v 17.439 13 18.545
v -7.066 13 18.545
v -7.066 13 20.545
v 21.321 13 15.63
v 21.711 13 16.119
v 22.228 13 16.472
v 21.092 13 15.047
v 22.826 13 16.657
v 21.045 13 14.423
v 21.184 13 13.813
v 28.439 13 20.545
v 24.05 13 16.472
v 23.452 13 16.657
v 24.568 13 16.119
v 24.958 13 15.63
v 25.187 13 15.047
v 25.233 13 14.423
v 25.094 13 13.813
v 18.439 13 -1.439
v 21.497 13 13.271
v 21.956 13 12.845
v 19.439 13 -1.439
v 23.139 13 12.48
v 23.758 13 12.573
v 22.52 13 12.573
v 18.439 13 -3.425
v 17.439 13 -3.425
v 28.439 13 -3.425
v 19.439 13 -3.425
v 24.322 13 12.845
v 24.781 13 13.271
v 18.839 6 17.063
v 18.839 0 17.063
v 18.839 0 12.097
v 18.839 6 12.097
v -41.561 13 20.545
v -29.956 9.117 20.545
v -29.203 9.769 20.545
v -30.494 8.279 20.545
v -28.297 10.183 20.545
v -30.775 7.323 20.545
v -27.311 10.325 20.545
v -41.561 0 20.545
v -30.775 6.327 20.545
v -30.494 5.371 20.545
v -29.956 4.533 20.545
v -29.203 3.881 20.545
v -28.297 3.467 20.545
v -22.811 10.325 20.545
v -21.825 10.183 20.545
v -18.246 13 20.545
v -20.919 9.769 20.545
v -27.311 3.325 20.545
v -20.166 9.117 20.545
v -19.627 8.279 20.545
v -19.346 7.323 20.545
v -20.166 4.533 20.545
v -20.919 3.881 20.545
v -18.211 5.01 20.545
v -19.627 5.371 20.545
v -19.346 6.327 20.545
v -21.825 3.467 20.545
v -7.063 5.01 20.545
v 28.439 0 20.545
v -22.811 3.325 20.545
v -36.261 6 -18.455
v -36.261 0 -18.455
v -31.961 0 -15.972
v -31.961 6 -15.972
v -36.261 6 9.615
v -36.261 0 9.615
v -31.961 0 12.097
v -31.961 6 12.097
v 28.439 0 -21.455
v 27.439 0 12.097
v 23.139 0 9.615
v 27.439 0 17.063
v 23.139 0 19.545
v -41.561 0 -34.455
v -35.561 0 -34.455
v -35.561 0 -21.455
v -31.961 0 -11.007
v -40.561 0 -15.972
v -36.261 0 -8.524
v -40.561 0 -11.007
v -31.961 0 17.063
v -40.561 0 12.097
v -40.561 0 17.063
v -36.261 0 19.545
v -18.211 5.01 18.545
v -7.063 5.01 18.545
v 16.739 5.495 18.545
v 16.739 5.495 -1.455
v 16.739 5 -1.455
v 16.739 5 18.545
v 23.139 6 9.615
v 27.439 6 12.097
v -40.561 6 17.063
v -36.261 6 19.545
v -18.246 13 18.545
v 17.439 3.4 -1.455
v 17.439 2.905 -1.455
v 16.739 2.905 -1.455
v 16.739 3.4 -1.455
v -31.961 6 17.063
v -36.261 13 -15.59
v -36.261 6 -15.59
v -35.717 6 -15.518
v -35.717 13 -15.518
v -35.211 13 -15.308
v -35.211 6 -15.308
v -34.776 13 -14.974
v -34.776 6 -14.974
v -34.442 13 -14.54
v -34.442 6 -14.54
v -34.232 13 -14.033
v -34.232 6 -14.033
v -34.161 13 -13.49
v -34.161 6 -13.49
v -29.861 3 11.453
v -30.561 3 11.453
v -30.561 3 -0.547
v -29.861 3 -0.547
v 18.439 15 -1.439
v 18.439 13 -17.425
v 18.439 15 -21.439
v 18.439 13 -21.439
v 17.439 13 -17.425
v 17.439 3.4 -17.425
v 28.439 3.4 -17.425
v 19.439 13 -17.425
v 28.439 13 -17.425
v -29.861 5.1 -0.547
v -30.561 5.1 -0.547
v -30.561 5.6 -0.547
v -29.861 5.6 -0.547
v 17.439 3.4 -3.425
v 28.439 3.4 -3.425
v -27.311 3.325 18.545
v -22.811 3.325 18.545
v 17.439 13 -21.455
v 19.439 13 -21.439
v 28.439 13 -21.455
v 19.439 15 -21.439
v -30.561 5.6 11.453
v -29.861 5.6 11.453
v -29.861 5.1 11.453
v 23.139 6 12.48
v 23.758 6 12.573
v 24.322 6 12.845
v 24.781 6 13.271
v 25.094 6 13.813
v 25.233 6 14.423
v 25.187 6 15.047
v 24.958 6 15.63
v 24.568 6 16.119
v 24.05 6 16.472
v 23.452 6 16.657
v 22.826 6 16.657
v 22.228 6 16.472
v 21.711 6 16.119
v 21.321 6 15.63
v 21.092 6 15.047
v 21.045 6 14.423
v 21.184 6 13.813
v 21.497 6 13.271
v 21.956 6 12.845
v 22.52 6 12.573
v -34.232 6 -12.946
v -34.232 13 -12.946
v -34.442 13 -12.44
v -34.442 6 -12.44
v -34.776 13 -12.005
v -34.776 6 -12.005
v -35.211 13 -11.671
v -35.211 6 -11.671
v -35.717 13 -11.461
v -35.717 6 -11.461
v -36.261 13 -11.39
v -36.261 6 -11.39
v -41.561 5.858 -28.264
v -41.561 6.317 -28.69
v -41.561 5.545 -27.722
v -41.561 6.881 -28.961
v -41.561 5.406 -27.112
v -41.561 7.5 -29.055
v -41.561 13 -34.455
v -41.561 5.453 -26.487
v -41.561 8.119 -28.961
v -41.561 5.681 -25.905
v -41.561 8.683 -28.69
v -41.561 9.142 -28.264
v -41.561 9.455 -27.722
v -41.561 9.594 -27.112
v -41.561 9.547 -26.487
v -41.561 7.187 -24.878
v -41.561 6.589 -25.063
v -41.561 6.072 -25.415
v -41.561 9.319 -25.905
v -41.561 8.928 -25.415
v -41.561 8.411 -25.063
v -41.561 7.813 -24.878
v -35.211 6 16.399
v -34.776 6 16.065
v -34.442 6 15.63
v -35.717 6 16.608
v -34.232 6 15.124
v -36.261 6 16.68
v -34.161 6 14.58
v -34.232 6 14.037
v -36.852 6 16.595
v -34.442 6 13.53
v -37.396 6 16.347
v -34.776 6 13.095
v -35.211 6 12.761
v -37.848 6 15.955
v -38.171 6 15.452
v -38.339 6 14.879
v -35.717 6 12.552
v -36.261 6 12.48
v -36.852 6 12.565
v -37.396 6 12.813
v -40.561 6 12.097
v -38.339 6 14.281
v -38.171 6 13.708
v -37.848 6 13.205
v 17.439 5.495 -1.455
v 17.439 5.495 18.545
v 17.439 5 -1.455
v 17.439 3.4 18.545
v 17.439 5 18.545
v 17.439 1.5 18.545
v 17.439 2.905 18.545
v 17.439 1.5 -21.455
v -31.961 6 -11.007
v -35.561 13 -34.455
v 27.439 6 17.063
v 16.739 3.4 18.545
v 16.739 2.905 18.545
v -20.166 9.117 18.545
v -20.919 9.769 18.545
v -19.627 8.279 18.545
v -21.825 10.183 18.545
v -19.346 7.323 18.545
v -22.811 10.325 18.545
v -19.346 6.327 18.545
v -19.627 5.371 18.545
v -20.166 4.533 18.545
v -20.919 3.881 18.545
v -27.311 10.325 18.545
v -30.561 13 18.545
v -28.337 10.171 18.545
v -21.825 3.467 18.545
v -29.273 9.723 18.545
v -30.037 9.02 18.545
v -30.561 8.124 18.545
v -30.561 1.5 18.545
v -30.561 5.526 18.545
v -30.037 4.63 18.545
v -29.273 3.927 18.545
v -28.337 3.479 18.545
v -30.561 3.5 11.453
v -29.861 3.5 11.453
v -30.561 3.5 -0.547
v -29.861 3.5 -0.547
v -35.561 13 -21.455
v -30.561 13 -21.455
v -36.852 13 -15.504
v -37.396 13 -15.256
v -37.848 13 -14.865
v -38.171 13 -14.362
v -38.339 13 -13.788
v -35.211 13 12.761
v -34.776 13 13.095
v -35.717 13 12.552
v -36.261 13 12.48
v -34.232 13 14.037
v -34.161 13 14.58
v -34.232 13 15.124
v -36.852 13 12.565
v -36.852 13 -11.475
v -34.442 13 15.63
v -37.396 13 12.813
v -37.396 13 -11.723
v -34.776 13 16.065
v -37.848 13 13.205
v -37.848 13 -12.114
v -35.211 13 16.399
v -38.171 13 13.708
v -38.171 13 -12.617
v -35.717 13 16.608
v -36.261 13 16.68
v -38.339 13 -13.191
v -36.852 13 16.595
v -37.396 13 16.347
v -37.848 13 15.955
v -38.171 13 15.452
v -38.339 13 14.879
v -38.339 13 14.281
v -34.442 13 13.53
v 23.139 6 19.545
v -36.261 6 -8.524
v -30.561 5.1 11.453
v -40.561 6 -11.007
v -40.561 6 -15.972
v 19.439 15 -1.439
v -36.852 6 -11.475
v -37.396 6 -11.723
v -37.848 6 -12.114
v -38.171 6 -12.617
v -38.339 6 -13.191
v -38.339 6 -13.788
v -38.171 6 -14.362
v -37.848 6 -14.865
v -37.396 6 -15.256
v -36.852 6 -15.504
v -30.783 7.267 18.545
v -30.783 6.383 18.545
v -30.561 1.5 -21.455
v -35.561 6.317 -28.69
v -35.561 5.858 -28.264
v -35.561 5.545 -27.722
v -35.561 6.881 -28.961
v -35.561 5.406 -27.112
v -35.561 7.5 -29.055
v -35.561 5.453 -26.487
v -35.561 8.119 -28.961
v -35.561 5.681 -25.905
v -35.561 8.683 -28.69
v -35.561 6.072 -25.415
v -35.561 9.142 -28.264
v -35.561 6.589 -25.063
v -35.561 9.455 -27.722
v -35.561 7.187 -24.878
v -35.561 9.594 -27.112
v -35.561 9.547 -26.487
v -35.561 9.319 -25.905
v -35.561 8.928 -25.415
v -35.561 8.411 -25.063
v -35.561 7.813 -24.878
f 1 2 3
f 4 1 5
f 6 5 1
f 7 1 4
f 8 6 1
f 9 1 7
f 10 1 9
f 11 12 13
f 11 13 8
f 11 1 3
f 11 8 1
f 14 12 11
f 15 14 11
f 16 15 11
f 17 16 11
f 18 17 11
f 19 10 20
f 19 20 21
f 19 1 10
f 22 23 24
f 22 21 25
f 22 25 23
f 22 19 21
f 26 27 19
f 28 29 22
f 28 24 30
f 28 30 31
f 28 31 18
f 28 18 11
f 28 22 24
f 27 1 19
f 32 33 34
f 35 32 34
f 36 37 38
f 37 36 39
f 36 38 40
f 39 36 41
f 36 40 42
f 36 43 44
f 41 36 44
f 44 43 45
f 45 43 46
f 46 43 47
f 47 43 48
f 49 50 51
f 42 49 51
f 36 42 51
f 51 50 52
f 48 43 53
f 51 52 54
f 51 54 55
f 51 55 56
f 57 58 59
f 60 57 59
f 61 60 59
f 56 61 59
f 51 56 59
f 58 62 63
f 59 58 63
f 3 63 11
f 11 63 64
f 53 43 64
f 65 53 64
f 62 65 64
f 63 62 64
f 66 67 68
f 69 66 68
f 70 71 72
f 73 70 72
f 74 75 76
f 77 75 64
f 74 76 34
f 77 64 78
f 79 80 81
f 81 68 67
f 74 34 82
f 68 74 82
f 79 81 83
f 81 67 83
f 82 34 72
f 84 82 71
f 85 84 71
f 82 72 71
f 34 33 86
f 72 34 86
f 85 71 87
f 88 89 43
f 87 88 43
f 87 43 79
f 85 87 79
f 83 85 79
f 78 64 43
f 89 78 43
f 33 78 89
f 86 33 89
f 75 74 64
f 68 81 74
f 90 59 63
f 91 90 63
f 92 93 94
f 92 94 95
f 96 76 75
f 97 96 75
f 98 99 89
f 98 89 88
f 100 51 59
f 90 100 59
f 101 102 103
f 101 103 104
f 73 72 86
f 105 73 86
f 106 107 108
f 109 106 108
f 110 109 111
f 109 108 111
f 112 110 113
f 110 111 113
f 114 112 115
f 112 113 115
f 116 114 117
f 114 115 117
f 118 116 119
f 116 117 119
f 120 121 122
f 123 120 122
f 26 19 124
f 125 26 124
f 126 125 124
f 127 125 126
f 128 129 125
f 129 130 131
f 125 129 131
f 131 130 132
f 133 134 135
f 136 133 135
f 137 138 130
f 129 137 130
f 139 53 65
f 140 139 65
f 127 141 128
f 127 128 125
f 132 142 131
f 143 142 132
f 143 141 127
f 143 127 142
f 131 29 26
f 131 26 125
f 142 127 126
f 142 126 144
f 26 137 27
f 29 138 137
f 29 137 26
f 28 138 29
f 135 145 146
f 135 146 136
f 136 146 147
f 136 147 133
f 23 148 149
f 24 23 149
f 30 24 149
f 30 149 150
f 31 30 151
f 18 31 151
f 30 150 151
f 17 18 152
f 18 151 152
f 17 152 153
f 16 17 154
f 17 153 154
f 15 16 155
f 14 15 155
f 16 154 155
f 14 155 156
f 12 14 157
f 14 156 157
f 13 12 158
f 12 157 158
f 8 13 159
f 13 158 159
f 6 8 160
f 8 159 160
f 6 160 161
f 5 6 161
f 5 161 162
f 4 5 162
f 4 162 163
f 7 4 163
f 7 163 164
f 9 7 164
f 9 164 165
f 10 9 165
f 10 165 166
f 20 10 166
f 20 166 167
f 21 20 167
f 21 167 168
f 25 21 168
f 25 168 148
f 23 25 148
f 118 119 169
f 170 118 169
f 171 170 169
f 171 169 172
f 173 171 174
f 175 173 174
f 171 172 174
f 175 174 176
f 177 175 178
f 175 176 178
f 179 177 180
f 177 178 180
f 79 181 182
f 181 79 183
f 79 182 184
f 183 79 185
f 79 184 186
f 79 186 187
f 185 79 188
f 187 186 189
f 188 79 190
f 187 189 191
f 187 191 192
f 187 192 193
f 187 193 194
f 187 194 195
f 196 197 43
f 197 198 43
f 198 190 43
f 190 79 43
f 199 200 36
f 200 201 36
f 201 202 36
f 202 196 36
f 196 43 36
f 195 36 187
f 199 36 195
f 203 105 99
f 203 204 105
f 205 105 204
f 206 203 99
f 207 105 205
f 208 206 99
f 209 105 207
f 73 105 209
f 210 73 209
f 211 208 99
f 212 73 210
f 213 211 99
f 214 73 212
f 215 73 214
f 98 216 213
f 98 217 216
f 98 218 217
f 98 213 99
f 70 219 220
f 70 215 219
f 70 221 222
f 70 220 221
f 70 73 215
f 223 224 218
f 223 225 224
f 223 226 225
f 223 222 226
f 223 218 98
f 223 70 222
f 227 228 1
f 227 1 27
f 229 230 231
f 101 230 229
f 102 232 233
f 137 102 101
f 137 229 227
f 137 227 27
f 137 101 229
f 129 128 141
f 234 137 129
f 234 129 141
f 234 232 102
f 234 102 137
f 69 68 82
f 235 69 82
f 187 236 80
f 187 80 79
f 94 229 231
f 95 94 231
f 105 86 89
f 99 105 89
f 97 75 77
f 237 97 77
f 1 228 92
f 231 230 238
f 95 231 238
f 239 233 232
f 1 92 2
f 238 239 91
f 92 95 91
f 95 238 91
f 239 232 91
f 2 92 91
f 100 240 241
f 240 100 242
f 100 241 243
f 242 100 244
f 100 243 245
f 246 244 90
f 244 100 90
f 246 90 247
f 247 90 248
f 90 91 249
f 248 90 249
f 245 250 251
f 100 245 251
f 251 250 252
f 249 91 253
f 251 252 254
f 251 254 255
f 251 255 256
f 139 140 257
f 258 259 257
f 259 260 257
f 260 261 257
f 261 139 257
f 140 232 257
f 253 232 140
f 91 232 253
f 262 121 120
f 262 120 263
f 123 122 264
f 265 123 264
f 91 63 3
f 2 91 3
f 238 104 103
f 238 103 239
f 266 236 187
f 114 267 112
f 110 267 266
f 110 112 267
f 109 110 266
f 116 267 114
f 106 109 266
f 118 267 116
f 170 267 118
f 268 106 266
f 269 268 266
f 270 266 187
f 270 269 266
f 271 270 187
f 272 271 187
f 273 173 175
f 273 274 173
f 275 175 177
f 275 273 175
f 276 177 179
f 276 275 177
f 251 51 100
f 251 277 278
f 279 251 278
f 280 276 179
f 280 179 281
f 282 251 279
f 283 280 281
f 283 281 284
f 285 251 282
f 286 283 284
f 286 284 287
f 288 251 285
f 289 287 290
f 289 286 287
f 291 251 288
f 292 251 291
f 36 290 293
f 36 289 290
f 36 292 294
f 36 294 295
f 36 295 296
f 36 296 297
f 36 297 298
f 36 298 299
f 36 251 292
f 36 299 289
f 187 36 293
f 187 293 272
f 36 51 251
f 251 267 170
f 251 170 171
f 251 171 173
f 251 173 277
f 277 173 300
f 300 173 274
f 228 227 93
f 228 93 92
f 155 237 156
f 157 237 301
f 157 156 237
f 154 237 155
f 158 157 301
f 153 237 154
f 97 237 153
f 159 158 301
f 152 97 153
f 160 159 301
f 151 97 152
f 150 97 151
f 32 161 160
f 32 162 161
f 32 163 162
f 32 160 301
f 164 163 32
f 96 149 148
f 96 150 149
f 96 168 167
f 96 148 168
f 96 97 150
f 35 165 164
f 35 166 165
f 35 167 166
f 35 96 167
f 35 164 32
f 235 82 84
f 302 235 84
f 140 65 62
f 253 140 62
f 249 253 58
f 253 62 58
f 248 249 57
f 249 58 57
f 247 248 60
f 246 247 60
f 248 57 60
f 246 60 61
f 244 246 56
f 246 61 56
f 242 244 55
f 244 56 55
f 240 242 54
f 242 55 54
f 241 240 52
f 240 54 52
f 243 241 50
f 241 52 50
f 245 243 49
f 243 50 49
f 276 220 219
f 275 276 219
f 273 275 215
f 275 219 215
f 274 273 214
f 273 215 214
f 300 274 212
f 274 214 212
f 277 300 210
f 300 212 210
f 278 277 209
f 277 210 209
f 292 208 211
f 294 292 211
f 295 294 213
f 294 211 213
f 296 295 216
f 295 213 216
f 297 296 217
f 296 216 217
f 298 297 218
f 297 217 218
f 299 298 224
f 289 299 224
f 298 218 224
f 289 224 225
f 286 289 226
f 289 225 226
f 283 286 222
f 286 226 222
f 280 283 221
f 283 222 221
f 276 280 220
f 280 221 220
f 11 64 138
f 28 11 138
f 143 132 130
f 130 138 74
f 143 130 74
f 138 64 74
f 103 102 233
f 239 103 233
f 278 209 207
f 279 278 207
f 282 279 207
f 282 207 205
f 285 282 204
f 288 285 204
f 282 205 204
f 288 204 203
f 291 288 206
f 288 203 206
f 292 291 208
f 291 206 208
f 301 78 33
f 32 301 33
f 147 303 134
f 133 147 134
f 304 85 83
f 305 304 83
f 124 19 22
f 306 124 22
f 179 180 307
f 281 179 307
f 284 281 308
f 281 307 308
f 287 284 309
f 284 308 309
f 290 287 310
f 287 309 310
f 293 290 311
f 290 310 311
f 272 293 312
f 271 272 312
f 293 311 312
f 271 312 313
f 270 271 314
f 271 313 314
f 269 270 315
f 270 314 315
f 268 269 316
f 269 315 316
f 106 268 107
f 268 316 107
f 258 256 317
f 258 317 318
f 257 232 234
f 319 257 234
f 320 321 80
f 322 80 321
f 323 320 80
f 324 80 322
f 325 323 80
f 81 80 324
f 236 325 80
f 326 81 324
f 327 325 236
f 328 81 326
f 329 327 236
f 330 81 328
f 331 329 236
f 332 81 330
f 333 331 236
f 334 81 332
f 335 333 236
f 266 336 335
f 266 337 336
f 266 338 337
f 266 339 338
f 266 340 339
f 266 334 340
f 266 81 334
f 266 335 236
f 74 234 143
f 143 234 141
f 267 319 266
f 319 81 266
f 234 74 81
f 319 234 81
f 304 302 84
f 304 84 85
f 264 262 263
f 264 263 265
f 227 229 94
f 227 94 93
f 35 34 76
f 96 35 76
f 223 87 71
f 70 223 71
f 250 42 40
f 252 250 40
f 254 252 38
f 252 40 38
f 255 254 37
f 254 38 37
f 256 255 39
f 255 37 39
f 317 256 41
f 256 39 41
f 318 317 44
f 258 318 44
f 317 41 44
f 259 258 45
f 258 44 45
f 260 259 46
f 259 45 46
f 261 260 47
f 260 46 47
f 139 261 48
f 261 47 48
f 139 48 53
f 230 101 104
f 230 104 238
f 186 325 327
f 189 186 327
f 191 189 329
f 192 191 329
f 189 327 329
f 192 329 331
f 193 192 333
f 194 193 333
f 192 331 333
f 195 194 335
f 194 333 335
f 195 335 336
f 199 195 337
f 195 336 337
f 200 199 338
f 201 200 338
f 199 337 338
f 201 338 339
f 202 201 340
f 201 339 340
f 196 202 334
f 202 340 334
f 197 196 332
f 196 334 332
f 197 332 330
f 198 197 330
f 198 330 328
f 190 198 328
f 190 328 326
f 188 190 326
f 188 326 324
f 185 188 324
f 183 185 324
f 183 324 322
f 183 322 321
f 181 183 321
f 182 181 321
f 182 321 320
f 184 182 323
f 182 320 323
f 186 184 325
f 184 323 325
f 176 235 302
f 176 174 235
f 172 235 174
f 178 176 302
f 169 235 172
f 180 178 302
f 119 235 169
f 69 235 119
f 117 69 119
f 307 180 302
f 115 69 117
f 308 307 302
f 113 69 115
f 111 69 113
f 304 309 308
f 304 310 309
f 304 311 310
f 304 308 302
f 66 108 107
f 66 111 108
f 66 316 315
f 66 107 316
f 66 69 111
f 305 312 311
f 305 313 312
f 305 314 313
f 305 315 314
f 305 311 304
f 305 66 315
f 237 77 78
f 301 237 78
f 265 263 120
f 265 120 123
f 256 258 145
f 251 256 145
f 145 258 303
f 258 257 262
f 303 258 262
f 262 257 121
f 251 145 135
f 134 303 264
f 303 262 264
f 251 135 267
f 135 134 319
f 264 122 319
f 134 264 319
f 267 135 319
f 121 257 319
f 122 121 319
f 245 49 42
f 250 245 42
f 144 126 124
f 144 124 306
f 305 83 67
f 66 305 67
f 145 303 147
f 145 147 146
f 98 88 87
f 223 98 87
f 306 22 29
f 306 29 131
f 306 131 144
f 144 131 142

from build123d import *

# Parameters (mm, degrees)
SKETCH_1_W          = 11
SKETCH_1_H          = 40
EXTRUDE_1_DEPTH     = 13
SKETCH_2_W          = 40
SKETCH_2_H          = 1.5
EXTRUDE_2_DEPTH     = 48
SKETCH_3_W          = 12
SKETCH_3_H          = 0.5
EXTRUDE_3_DEPTH     = 0.7
SKETCH_4_W          = 20
SKETCH_4_H          = 0.495112862
EXTRUDE_4_DEPTH     = 0.7
CUT_EXTRUDE_1_DEPTH = 6
SKETCH_10_R         = 2.1
CUT_EXTRUDE_2_DEPTH = 9
CUT_EXTRUDE_3_DEPTH = 2
CUT_EXTRUDE_4_DEPTH = 2
SKETCH_17_W         = 1
SKETCH_17_H         = 20
EXTRUDE_6_DEPTH     = 2
SKETCH_21_W         = 6
SKETCH_21_H         = 13
EXTRUDE_8_DEPTH     = 13
SKETCH_23_R         = 2.1
CUT_EXTRUDE_7_DEPTH = 6
SKETCH_25_W         = 14
SKETCH_25_H         = 9.6
CUT_EXTRUDE_8_DEPTH = 11


with BuildPart() as part:
    # 草图1 → 凸台-拉伸1 (new body)
    with BuildSketch(Plane(origin=(0, 0, 0), x_dir=(1, 0, 0), z_dir=(0, 1, 0))):
        with Locations((-36.060761024, 1.454759243)):
            Rectangle(SKETCH_1_W, SKETCH_1_H)
        Polygon((17.439238976, -18.545240757), (-30.560761024, -18.545240757), (-41.560761024, -18.545240757), (-41.560761024, -20.545240757), (28.439238976, -20.545240757), (28.439238976, -18.545240757), align=None)
        with Locations((22.939238976, 1.454759243)):
            Rectangle(SKETCH_1_W, SKETCH_1_H)
    extrude(amount=EXTRUDE_1_DEPTH)

    # 草图2 → 凸台-拉伸2 (add)
    with BuildSketch(Plane(origin=(-30.560761024, 0, 0), x_dir=(0, 0, -1), z_dir=(1, 0, 0))):
        with Locations((1.454759243, 0.75)):
            Rectangle(SKETCH_2_W, SKETCH_2_H)
    extrude(amount=EXTRUDE_2_DEPTH)

    # 草图3 → 凸台-拉伸3 (add)
    with BuildSketch(Plane(origin=(-30.560761024, 0, 0), x_dir=(0, 0, -1), z_dir=(1, 0, 0))):
        with Locations((-5.453399323, 5.35)):
            Rectangle(SKETCH_3_W, SKETCH_3_H)
        with Locations((-5.453399323, 3.25)):
            Rectangle(SKETCH_3_W, SKETCH_3_H)
    extrude(amount=EXTRUDE_3_DEPTH)

    # 草图4 → 凸台-拉伸4 (add)
    with BuildSketch(Plane.ZY.offset(-17.439238976)):
        with Locations((8.545240757, 3.152443569)):
            Rectangle(SKETCH_4_W, SKETCH_4_H)
        with Locations((8.545240757, 5.247556431)):
            Rectangle(SKETCH_4_W, SKETCH_4_H)
    extrude(amount=EXTRUDE_4_DEPTH)

    # 草图5 → 切除-拉伸1 (cut)
    with BuildSketch(Plane(origin=(0, 0, 0), x_dir=(-1, 0, 0), z_dir=(0, -1, 0))):
        Polygon((-27.439238976, -12.097422285), (-27.439238976, -17.0626346), (-23.139238976, -19.545240757), (-18.839238976, -17.0626346), (-18.839238976, -12.097422285), (-23.139238976, -9.614816127), align=None)
        Polygon((31.960761024, -12.097422285), (31.960761024, -17.0626346), (36.260761024, -19.545240757), (40.560761024, -17.0626346), (40.560761024, -12.097422285), (36.260761024, -9.614816127), align=None)
        Polygon((31.960761024, 15.972153085), (31.960761024, 11.00694077), (36.260761024, 8.524334613), (40.560761024, 11.00694077), (40.560761024, 15.972153085), (36.260761024, 18.454759243), align=None)
    extrude(amount=-CUT_EXTRUDE_1_DEPTH, mode=Mode.SUBTRACT)

    # 草图10 → 切除-拉伸2 (cut)
    with BuildSketch(Plane.XZ.offset(-6)):
        with BuildLine():
            ThreePointArc((-34.160761024, -13.489546928), (-34.775836783, -12.004622687), (-36.260761024, -11.389546928))
            Line((-36.260761024, -11.389546928), (-36.260761024, -15.589546928))
            ThreePointArc((-36.260761024, -15.589546928), (-34.775836783, -14.974471168), (-34.160761024, -13.489546928))
        make_face()
        with BuildLine():
            Line((-36.260761024, -15.589546928), (-36.260761024, -11.389546928))
            ThreePointArc((-36.260761024, -11.389546928), (-38.360761024, -13.489546928), (-36.260761024, -15.589546928))
        make_face()
        with BuildLine():
            ThreePointArc((-34.160761024, 14.580028442), (-34.775836783, 16.064952683), (-36.260761024, 16.680028442))
            Line((-36.260761024, 16.680028442), (-36.260761024, 12.480028442))
            ThreePointArc((-36.260761024, 12.480028442), (-34.775836783, 13.095104202), (-34.160761024, 14.580028442))
        make_face()
        with BuildLine():
            Line((-36.260761024, 12.480028442), (-36.260761024, 16.680028442))
            ThreePointArc((-36.260761024, 16.680028442), (-38.360761024, 14.580028442), (-36.260761024, 12.480028442))
        make_face()
        with Locations(Location((23.139238976, 14.580028442, 0), (0, 0, 270))):
            Circle(SKETCH_10_R)
    extrude(amount=-CUT_EXTRUDE_2_DEPTH, mode=Mode.SUBTRACT)

    # 草图12 → 切除-拉伸3 (cut)
    with BuildSketch(Plane.XY.offset(20.545240757)):
        with BuildLine():
            Line((-27.310761024, 3.325), (-22.810761024, 3.325))
            ThreePointArc((-22.810761024, 3.325), (-19.310761024, 6.825), (-22.810761024, 10.325))
            Line((-22.810761024, 10.325), (-27.310761024, 10.325))
            ThreePointArc((-27.310761024, 10.325), (-30.810761024, 6.825), (-27.310761024, 3.325))
        make_face()
    extrude(amount=-CUT_EXTRUDE_3_DEPTH, mode=Mode.SUBTRACT)

    # 草图13 → 切除-拉伸4 (cut)
    with BuildSketch(Plane.XY.offset(20.545240757)):
        Polygon((-18.245761024, 13), (-18.210761024, 5.01), (-7.063003257, 5.01), (-7.065761024, 13), align=None)
    extrude(amount=-CUT_EXTRUDE_4_DEPTH, mode=Mode.SUBTRACT)

    # 草图17 → 凸台-拉伸6 (add)
    with BuildSketch(Plane(origin=(0, 13, 0), x_dir=(1, 0, 0), z_dir=(0, 1, 0))):
        with Locations((18.939238976, 11.439097948)):
            Rectangle(SKETCH_17_W, SKETCH_17_H)
    extrude(amount=EXTRUDE_6_DEPTH)

    # 草图21 → 凸台-拉伸8 (add)
    with BuildSketch(Plane(origin=(0, 0, -21.454759243), x_dir=(-1, 0, 0), z_dir=(0, 0, -1))):
        with Locations((38.560761024, 6.5)):
            Rectangle(SKETCH_21_W, SKETCH_21_H)
    extrude(amount=EXTRUDE_8_DEPTH)

    # 草图23 → 切除-拉伸7 (cut)
    with BuildSketch(Plane(origin=(-35.560761024, 0, 0), x_dir=(0, 0, -1), z_dir=(1, 0, 0))):
        with Locations((26.954759243, 7.5)):
            Circle(SKETCH_23_R)
    extrude(amount=-CUT_EXTRUDE_7_DEPTH, mode=Mode.SUBTRACT)

    # 草图25 → 切除-拉伸8 (cut)
    with BuildSketch(Plane(origin=(28.439238976, 0, 0), x_dir=(0, 0, -1), z_dir=(1, 0, 0))):
        with Locations((10.424759243, 8.2)):
            Rectangle(SKETCH_25_W, SKETCH_25_H)
    extrude(amount=-CUT_EXTRUDE_8_DEPTH, mode=Mode.SUBTRACT)


solid = part.part
